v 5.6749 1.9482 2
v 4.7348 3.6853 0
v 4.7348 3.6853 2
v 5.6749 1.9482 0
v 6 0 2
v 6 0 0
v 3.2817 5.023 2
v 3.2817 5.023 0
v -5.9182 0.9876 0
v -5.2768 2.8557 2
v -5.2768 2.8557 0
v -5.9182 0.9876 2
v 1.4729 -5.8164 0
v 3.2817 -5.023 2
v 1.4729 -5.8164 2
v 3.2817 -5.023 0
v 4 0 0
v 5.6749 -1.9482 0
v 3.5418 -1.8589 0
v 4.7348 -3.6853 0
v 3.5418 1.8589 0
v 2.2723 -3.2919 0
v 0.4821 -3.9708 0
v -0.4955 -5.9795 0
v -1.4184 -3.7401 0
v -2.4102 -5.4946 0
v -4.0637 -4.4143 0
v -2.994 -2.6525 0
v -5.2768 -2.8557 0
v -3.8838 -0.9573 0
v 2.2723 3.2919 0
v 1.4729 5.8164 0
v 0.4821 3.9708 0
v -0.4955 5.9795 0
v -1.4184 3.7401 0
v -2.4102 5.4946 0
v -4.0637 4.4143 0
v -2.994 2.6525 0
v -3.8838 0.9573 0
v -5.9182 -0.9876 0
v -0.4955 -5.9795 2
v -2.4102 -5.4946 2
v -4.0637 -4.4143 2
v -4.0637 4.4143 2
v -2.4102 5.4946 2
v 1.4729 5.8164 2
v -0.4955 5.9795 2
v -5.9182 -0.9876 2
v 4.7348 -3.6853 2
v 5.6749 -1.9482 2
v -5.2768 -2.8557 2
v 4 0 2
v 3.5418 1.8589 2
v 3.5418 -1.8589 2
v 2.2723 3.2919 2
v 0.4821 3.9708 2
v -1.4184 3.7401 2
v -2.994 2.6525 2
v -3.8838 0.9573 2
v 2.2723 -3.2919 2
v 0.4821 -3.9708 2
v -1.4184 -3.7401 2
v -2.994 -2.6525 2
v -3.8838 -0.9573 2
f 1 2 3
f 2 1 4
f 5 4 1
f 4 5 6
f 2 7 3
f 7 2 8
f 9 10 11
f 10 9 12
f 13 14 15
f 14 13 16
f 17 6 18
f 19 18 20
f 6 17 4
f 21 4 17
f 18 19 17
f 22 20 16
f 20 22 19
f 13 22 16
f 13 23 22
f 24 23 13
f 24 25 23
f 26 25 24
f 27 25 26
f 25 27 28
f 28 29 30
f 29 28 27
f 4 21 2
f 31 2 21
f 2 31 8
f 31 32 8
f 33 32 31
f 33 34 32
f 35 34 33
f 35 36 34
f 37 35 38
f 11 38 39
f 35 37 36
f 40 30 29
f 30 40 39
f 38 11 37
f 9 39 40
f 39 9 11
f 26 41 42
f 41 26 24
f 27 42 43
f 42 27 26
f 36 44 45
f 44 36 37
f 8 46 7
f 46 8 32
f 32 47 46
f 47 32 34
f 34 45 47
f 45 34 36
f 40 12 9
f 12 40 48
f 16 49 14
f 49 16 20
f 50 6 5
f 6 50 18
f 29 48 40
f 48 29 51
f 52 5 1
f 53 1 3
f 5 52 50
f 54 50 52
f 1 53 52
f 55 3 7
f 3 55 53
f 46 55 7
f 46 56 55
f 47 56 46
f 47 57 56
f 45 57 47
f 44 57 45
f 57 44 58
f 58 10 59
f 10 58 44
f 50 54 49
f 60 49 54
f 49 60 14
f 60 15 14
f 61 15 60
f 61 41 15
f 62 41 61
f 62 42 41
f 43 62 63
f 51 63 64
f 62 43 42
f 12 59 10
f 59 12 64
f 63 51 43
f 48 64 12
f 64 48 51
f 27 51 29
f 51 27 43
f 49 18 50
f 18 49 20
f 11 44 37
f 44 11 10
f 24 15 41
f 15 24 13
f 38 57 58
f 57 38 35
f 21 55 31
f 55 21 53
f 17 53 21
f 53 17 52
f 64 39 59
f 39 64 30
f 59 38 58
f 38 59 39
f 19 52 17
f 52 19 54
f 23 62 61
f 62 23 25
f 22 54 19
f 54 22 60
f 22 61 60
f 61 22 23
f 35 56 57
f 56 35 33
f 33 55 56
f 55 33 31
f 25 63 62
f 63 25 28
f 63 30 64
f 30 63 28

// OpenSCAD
// part_id: a5
// name: A5 ring
// source_drawing_ids: DRW-001
// units: mm
// revision: 0.1-placeholder
// SPDX-License-Identifier: MIT

module part_a5(od = 12, id = 8, th = 2) {
    difference() {
        cylinder(d = od, h = th, center = false);
        translate([0, 0, -0.1]) cylinder(d = id, h = th + 0.2, center = false);
    }
}


// ---- "main guard" ----
// Default to previewing when opened directly:
if (is_undef(__LIB_MODE__)) {
    part_a5();
}
